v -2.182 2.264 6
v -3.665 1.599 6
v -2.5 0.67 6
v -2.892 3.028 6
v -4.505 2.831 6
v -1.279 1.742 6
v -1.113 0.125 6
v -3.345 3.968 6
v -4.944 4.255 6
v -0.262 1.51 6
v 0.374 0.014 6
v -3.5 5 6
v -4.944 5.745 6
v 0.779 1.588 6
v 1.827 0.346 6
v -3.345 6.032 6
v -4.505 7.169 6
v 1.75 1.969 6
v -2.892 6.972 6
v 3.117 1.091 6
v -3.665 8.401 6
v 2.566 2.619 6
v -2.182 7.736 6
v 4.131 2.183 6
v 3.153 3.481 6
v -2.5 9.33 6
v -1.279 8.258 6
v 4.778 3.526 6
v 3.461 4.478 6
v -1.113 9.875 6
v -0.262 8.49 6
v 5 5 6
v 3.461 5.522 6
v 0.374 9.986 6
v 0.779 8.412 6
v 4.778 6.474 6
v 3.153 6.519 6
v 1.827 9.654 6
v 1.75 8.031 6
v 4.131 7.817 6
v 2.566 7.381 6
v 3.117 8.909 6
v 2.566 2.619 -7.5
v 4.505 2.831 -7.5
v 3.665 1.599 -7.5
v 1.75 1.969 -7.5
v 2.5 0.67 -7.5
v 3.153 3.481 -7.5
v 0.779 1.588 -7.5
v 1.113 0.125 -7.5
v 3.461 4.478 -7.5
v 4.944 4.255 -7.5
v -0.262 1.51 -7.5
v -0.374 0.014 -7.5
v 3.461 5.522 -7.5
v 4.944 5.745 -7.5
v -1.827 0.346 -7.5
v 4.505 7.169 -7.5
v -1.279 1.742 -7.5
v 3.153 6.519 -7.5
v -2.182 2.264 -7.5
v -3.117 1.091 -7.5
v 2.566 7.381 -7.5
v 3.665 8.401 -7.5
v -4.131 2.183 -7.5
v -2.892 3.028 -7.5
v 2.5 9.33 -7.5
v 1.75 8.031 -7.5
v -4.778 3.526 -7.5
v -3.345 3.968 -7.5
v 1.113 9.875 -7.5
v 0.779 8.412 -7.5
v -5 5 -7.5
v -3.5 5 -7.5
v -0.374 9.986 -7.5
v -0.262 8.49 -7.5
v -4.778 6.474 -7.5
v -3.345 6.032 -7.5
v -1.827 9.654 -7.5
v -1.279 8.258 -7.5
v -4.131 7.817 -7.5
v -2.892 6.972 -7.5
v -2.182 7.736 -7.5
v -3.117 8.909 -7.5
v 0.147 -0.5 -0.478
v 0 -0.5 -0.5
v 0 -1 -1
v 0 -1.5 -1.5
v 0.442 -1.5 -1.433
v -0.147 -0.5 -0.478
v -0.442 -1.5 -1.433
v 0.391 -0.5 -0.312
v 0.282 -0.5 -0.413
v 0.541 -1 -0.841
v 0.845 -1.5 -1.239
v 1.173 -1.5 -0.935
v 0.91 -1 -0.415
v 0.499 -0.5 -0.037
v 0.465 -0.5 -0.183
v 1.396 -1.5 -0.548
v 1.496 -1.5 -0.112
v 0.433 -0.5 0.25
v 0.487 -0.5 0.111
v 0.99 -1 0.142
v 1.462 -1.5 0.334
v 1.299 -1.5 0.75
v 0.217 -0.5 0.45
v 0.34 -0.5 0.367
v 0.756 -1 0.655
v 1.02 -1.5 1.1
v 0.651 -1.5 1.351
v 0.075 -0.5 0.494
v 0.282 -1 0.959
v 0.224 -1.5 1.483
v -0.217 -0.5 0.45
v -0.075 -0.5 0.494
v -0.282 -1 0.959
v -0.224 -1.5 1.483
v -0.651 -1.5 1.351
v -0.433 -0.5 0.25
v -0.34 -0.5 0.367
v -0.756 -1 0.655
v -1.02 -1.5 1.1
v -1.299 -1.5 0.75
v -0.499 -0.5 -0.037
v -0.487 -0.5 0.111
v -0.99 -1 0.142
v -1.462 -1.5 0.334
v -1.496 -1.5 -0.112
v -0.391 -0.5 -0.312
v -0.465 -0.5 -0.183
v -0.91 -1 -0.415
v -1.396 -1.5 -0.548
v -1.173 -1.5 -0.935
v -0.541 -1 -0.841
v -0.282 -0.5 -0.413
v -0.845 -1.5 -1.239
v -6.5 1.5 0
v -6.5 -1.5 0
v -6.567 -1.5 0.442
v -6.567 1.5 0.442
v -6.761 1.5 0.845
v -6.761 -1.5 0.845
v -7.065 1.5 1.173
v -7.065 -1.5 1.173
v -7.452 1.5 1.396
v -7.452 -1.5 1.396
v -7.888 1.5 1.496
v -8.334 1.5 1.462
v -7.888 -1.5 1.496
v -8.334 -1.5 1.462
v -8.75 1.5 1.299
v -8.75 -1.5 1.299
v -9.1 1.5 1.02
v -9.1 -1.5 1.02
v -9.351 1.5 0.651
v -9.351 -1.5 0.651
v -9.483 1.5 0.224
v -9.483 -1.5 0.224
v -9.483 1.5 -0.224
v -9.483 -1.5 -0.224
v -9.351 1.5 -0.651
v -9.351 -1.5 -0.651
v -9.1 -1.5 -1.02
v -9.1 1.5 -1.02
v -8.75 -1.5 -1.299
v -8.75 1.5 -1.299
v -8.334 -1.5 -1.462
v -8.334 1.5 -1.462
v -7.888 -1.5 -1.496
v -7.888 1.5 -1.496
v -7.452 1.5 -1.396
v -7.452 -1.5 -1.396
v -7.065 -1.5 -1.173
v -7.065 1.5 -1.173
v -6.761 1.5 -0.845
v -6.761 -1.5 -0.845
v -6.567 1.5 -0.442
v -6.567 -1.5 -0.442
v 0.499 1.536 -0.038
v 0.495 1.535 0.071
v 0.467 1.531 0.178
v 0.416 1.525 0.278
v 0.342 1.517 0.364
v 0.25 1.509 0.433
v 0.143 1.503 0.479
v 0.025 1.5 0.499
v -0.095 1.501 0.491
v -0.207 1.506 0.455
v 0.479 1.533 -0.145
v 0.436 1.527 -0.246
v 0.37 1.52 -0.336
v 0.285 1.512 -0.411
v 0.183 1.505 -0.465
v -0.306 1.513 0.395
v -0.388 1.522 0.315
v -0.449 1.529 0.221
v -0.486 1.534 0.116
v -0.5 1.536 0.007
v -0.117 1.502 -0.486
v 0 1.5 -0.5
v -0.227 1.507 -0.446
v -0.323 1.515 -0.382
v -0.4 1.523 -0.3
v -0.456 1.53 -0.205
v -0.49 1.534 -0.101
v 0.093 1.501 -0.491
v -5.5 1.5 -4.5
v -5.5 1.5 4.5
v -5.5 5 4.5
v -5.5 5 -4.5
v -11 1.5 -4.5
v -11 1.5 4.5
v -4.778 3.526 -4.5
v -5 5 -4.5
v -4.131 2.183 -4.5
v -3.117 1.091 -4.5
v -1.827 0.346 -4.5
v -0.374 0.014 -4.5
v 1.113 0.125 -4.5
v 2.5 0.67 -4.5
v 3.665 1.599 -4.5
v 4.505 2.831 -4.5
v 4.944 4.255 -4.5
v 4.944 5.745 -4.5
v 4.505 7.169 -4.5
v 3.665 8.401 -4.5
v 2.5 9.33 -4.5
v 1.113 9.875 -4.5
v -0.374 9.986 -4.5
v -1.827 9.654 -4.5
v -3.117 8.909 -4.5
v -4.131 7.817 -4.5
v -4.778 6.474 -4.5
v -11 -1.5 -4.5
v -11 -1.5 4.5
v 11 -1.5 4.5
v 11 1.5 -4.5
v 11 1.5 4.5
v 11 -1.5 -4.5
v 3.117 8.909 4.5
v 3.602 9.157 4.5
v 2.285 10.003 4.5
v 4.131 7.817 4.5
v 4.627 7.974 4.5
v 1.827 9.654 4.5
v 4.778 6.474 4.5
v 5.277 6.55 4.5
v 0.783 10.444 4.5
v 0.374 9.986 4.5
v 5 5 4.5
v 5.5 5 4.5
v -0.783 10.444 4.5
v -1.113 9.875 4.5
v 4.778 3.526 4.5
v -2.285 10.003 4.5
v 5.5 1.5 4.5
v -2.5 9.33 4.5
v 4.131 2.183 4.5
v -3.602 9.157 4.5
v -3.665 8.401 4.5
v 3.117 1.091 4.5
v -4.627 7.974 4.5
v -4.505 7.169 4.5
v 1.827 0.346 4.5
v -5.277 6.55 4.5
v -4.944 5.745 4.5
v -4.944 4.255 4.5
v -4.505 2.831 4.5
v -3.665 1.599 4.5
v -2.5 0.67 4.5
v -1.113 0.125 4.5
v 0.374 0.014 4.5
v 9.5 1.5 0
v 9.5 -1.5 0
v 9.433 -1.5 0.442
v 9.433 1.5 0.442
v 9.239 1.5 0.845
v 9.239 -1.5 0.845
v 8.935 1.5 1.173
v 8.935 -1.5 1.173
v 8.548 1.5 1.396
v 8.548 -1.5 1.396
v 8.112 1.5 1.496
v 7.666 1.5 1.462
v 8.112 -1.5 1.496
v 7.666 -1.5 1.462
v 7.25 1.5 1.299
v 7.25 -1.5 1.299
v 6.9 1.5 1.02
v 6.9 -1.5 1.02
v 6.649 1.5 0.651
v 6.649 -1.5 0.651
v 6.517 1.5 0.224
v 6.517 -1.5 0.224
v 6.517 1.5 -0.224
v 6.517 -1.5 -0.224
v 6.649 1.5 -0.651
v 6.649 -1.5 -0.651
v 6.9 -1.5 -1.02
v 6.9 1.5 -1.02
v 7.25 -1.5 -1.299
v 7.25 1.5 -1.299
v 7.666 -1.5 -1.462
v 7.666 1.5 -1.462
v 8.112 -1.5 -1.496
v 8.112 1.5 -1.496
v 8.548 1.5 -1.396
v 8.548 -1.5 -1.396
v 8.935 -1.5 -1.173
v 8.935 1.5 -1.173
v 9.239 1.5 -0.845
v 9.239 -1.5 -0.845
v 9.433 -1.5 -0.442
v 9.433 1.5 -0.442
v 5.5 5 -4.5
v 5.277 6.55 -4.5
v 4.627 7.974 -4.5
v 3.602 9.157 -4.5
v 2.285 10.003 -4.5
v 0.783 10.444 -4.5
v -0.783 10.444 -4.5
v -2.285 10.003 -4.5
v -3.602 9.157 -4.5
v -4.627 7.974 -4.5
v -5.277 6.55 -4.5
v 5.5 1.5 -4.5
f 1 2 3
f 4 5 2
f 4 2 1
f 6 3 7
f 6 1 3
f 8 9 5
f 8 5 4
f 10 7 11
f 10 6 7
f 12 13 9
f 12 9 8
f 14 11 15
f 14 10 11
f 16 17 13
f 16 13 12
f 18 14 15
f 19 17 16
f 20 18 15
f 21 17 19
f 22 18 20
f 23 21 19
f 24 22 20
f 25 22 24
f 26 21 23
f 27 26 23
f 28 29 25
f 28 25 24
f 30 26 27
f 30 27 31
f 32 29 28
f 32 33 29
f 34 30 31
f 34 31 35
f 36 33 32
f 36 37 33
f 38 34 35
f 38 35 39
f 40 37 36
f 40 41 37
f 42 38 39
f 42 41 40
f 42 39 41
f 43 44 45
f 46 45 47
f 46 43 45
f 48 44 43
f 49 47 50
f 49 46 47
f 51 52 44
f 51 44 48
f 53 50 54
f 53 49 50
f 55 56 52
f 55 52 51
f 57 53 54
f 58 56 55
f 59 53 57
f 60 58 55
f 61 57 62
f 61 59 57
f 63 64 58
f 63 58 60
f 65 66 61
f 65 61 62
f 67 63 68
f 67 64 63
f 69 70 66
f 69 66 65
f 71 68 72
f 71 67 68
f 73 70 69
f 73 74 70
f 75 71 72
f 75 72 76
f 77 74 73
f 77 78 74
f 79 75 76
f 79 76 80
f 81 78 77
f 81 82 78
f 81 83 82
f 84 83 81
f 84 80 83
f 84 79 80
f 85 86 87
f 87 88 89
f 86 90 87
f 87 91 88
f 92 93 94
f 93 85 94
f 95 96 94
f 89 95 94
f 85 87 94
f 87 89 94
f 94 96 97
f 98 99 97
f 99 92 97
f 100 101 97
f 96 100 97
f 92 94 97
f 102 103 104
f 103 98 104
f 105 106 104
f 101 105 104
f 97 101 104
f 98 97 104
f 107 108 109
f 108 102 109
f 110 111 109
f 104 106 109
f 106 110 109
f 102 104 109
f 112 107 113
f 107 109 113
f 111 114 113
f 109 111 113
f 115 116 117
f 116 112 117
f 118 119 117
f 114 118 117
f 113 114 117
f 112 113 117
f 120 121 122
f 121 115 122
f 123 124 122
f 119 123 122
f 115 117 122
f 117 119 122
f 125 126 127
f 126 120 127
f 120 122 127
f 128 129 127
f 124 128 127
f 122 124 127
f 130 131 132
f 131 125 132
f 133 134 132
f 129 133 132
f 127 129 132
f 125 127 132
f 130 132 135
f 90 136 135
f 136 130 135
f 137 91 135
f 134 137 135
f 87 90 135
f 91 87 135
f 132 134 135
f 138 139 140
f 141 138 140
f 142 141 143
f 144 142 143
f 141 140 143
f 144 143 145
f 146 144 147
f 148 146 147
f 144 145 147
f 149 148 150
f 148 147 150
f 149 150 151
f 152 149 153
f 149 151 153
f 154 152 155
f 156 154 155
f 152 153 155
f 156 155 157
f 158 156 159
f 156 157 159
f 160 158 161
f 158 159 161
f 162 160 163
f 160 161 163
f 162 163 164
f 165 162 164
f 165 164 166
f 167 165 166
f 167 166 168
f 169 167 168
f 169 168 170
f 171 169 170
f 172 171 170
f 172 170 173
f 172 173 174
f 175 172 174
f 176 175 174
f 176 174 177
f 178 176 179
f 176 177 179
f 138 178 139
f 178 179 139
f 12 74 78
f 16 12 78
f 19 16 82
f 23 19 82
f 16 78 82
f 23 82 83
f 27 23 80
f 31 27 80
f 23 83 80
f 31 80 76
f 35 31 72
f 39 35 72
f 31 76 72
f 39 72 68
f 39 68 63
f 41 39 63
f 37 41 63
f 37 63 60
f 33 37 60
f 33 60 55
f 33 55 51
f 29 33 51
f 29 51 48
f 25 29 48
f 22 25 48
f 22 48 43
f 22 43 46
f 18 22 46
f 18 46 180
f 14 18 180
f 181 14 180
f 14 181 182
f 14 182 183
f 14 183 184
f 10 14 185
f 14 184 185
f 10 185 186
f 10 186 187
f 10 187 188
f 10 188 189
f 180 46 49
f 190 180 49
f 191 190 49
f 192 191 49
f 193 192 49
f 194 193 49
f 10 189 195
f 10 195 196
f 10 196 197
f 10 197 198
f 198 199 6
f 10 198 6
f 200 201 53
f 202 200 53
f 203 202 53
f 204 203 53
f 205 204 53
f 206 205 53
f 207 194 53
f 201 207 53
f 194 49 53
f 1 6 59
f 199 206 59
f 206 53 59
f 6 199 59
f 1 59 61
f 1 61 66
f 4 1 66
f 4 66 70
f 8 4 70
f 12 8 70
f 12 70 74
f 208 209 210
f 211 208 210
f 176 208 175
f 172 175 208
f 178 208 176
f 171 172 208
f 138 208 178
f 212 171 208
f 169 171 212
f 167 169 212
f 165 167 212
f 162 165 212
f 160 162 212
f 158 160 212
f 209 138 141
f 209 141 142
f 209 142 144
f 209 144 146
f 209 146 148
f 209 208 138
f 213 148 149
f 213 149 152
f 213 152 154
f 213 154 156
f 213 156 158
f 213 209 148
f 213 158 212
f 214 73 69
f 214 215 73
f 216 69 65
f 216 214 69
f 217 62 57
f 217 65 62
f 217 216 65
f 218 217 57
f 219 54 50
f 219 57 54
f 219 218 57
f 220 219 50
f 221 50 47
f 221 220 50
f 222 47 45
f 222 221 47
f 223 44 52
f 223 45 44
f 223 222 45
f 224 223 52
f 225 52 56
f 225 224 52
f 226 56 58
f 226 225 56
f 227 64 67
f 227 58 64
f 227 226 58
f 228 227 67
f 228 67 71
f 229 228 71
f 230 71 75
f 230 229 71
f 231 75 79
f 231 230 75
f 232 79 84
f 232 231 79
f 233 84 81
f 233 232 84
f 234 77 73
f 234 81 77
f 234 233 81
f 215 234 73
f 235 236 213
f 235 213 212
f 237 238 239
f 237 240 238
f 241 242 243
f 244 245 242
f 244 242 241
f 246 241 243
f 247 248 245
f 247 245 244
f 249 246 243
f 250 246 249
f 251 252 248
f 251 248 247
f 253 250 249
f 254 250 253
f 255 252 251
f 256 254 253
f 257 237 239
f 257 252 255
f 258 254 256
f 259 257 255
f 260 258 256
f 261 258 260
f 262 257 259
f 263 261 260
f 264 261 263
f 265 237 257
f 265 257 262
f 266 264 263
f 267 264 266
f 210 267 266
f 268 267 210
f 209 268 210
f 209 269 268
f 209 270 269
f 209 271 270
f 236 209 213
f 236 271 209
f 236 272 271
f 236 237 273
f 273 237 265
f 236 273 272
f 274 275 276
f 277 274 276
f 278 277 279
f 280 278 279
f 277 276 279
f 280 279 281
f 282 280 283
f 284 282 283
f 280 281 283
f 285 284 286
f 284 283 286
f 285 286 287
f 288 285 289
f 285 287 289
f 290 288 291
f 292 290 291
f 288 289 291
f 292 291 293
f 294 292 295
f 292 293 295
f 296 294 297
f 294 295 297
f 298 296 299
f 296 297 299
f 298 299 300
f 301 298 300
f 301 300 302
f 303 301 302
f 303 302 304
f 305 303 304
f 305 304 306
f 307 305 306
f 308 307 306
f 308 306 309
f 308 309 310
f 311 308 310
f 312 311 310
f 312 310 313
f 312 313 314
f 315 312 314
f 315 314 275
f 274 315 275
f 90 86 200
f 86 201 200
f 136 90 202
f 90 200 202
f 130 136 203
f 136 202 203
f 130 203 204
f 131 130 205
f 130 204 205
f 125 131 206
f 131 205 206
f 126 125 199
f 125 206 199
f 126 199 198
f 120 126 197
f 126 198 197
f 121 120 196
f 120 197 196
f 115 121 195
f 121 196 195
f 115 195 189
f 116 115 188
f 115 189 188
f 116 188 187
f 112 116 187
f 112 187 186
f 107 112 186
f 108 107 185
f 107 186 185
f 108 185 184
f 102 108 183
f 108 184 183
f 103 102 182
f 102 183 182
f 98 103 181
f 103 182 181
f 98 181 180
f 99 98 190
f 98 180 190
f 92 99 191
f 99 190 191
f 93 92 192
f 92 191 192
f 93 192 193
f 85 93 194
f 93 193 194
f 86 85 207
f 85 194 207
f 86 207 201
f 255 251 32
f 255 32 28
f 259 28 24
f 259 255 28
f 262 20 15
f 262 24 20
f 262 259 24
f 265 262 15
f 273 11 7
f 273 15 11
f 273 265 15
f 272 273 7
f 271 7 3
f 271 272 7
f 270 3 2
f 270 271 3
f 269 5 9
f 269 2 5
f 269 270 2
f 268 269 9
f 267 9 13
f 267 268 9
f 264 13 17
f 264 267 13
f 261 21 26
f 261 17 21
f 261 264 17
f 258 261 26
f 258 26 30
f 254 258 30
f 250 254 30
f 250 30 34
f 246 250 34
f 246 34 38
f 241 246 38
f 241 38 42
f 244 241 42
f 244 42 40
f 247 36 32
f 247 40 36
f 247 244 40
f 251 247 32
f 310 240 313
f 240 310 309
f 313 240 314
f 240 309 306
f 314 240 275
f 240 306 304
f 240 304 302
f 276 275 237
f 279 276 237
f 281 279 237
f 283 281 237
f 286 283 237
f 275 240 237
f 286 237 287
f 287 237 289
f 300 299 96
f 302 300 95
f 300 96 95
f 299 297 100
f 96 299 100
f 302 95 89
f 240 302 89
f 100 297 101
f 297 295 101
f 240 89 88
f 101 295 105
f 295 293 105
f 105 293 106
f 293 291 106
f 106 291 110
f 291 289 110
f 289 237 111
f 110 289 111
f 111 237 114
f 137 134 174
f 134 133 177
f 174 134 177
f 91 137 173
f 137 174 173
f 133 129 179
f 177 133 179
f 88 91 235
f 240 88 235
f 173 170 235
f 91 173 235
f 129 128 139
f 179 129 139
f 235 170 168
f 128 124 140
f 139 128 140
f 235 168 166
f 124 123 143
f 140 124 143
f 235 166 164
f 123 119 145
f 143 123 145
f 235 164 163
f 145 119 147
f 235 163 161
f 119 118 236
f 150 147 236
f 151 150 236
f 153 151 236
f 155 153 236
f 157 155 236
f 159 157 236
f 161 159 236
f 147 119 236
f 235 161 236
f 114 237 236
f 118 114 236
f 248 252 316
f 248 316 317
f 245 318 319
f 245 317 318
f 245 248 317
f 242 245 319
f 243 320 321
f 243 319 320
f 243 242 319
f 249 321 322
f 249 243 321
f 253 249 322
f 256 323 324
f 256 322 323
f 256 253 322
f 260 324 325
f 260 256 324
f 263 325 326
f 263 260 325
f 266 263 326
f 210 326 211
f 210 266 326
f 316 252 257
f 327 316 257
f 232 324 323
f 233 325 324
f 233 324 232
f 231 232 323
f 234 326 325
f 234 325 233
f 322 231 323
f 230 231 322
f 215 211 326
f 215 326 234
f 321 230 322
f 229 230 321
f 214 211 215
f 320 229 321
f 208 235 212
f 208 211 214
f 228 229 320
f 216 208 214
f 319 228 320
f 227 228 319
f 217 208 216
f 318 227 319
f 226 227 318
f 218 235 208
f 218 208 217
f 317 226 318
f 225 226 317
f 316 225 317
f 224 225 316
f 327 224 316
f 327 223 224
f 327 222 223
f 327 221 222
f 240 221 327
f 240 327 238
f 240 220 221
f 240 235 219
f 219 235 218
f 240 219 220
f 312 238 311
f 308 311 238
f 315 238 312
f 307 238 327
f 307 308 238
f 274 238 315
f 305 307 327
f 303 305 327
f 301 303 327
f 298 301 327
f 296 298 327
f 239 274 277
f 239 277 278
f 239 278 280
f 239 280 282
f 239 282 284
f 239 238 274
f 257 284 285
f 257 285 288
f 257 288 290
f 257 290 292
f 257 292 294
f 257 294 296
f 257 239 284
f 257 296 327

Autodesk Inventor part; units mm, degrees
ref_plane "YZ Plane" through (0, 0, 0) normal (1, 0, 0) x (0, 1, 0)
ref_plane "XZ Plane" through (0, 0, 0) normal (0, 1, 0) x (-1, 0, 0)
ref_plane "XY Plane" through (0, 0, 0) normal (0, 0, 1) x (1, 0, 0)
sketch "Sketch1" plane through (0, 0, 0) normal (0, 1, 0) x (-1, 0, 0)
  line L0 (11, -4.5) -> (-11, -4.5)
  line L1 (-11, -4.5) -> (-11, 4.5)
  line L2 (-11, 4.5) -> (11, 4.5)
  line L3 (11, 4.5) -> (11, -4.5)
  line L4 (11, -4.5) -> (-11, 4.5) construction
  line L5 (-11, -4.5) -> (11, 4.5) construction
  point P0 (0, 0)
  dimension "d0" = 22
  dimension "d1" = 9
extrude "Extrusion1" add sketch "Sketch1" along normal mid plane 3
sketch "Sketch2" plane through (-11, 1.5, 4.5) normal (0, 0, 1) x (1, 0, 0)
  line L0 (11, 9) -> (11, 9)
  line L1 (16.5, 3.5) -> (16.5, 0)
  line L2 (16.5, 0) -> (5.5, 0)
  line L3 (5.5, 0) -> (5.5, 3.5)
  line L4 (22, 0) -> (0, 0) projected
  line L5 (5.5, 4.5) -> (16.5, -4.5) construction
  line L6 (16.5, 4.5) -> (5.5, -4.5) construction
  arc A0 (11, 9) -> (5.5, 3.5) centre (11, 3.5) ccw
  arc A1 (16.5, 3.5) -> (11, 9) centre (11, 3.5) ccw
  point P0 (11, -1.5)
  point P1 (16.5, 9)
  point P2 (11, 0)
  dimension "d4" = 11
  dimension "d5" = 9
  dimension "d6" = 0
  dimension "d7" = 5.5
extrude "Extrusion2" add sketch "Sketch2" against normal blind 9
sketch "Sketch3" plane through (-11, -1.5, 4.5) normal (0, 0, 1) x (1, 0, 0)
  circle A0 centre (11, 6.5) radius 5
  line L0 (5.5, 6.5) -> (5.5, 3) projected
  point P0 (11, 1.5)
  dimension "d10" = 10
  dimension "d11" = 5.5
extrude "Extrusion3" add sketch "Sketch3" along normal blind 1.5
sketch "Sketch4" plane through (11, -1.5, -4.5) normal (0, 0, -1) x (-1, 0, 0)
  arc A0 (16.5, 6.5) -> (5.5, 6.5) centre (11, 6.5) ccw projected
  circle A1 centre (11, 6.5) radius 5
  point P0 (11, 1.5)
  dimension "d14" = 10
extrude "Extrusion4" add sketch "Sketch4" along normal blind 3
sketch "Sketch5" plane through (0, 5, -7.5) normal (0, 0, -1) x (-1, 0, 0)
  circle A0 centre (0, 0) radius 3.5
  point P0 (0, -5)
  dimension "d17" = 7
extrude "Extrusion5" cut sketch "Sketch5" against normal through all
sketch "Sketch6" plane through (0, -1.5, 0) normal (0, -1, 0) x (1, 0, 0)
  circle A0 centre (-8, 0) radius 1.5
  line L0 (-11, 4.5) -> (-11, -4.5) projected
  point P0 (0, 0)
  dimension "d20" = 3
  dimension "d21" = 3
extrude "Extrusion6" cut sketch "Sketch6" against normal through all
sketch "Sketch7" plane through (0, -1.5, 0) normal (0, -1, 0) x (1, 0, 0)
  circle A0 centre (8, 0) radius 1.5
  line L0 (11, -4.5) -> (11, 4.5) projected
  point P0 (0, 0)
  dimension "d24" = 3
  dimension "d25" = 3
extrude "Extrusion7" cut sketch "Sketch7" against normal through all
sketch "Sketch8" plane through (0, -1.5, 0) normal (0, -1, 0) x (1, 0, 0)
  circle A0 centre (0, 0) radius 1.5
  dimension "d28" = 3
hole "Hole1" at (0, -1.5, 0) direction (0, 1, 0) diameter 1 depth 3.04 tip angle 118 countersink diameter 3 countersink angle 90
properties material "Brass, Soft Yellow, Welded"
